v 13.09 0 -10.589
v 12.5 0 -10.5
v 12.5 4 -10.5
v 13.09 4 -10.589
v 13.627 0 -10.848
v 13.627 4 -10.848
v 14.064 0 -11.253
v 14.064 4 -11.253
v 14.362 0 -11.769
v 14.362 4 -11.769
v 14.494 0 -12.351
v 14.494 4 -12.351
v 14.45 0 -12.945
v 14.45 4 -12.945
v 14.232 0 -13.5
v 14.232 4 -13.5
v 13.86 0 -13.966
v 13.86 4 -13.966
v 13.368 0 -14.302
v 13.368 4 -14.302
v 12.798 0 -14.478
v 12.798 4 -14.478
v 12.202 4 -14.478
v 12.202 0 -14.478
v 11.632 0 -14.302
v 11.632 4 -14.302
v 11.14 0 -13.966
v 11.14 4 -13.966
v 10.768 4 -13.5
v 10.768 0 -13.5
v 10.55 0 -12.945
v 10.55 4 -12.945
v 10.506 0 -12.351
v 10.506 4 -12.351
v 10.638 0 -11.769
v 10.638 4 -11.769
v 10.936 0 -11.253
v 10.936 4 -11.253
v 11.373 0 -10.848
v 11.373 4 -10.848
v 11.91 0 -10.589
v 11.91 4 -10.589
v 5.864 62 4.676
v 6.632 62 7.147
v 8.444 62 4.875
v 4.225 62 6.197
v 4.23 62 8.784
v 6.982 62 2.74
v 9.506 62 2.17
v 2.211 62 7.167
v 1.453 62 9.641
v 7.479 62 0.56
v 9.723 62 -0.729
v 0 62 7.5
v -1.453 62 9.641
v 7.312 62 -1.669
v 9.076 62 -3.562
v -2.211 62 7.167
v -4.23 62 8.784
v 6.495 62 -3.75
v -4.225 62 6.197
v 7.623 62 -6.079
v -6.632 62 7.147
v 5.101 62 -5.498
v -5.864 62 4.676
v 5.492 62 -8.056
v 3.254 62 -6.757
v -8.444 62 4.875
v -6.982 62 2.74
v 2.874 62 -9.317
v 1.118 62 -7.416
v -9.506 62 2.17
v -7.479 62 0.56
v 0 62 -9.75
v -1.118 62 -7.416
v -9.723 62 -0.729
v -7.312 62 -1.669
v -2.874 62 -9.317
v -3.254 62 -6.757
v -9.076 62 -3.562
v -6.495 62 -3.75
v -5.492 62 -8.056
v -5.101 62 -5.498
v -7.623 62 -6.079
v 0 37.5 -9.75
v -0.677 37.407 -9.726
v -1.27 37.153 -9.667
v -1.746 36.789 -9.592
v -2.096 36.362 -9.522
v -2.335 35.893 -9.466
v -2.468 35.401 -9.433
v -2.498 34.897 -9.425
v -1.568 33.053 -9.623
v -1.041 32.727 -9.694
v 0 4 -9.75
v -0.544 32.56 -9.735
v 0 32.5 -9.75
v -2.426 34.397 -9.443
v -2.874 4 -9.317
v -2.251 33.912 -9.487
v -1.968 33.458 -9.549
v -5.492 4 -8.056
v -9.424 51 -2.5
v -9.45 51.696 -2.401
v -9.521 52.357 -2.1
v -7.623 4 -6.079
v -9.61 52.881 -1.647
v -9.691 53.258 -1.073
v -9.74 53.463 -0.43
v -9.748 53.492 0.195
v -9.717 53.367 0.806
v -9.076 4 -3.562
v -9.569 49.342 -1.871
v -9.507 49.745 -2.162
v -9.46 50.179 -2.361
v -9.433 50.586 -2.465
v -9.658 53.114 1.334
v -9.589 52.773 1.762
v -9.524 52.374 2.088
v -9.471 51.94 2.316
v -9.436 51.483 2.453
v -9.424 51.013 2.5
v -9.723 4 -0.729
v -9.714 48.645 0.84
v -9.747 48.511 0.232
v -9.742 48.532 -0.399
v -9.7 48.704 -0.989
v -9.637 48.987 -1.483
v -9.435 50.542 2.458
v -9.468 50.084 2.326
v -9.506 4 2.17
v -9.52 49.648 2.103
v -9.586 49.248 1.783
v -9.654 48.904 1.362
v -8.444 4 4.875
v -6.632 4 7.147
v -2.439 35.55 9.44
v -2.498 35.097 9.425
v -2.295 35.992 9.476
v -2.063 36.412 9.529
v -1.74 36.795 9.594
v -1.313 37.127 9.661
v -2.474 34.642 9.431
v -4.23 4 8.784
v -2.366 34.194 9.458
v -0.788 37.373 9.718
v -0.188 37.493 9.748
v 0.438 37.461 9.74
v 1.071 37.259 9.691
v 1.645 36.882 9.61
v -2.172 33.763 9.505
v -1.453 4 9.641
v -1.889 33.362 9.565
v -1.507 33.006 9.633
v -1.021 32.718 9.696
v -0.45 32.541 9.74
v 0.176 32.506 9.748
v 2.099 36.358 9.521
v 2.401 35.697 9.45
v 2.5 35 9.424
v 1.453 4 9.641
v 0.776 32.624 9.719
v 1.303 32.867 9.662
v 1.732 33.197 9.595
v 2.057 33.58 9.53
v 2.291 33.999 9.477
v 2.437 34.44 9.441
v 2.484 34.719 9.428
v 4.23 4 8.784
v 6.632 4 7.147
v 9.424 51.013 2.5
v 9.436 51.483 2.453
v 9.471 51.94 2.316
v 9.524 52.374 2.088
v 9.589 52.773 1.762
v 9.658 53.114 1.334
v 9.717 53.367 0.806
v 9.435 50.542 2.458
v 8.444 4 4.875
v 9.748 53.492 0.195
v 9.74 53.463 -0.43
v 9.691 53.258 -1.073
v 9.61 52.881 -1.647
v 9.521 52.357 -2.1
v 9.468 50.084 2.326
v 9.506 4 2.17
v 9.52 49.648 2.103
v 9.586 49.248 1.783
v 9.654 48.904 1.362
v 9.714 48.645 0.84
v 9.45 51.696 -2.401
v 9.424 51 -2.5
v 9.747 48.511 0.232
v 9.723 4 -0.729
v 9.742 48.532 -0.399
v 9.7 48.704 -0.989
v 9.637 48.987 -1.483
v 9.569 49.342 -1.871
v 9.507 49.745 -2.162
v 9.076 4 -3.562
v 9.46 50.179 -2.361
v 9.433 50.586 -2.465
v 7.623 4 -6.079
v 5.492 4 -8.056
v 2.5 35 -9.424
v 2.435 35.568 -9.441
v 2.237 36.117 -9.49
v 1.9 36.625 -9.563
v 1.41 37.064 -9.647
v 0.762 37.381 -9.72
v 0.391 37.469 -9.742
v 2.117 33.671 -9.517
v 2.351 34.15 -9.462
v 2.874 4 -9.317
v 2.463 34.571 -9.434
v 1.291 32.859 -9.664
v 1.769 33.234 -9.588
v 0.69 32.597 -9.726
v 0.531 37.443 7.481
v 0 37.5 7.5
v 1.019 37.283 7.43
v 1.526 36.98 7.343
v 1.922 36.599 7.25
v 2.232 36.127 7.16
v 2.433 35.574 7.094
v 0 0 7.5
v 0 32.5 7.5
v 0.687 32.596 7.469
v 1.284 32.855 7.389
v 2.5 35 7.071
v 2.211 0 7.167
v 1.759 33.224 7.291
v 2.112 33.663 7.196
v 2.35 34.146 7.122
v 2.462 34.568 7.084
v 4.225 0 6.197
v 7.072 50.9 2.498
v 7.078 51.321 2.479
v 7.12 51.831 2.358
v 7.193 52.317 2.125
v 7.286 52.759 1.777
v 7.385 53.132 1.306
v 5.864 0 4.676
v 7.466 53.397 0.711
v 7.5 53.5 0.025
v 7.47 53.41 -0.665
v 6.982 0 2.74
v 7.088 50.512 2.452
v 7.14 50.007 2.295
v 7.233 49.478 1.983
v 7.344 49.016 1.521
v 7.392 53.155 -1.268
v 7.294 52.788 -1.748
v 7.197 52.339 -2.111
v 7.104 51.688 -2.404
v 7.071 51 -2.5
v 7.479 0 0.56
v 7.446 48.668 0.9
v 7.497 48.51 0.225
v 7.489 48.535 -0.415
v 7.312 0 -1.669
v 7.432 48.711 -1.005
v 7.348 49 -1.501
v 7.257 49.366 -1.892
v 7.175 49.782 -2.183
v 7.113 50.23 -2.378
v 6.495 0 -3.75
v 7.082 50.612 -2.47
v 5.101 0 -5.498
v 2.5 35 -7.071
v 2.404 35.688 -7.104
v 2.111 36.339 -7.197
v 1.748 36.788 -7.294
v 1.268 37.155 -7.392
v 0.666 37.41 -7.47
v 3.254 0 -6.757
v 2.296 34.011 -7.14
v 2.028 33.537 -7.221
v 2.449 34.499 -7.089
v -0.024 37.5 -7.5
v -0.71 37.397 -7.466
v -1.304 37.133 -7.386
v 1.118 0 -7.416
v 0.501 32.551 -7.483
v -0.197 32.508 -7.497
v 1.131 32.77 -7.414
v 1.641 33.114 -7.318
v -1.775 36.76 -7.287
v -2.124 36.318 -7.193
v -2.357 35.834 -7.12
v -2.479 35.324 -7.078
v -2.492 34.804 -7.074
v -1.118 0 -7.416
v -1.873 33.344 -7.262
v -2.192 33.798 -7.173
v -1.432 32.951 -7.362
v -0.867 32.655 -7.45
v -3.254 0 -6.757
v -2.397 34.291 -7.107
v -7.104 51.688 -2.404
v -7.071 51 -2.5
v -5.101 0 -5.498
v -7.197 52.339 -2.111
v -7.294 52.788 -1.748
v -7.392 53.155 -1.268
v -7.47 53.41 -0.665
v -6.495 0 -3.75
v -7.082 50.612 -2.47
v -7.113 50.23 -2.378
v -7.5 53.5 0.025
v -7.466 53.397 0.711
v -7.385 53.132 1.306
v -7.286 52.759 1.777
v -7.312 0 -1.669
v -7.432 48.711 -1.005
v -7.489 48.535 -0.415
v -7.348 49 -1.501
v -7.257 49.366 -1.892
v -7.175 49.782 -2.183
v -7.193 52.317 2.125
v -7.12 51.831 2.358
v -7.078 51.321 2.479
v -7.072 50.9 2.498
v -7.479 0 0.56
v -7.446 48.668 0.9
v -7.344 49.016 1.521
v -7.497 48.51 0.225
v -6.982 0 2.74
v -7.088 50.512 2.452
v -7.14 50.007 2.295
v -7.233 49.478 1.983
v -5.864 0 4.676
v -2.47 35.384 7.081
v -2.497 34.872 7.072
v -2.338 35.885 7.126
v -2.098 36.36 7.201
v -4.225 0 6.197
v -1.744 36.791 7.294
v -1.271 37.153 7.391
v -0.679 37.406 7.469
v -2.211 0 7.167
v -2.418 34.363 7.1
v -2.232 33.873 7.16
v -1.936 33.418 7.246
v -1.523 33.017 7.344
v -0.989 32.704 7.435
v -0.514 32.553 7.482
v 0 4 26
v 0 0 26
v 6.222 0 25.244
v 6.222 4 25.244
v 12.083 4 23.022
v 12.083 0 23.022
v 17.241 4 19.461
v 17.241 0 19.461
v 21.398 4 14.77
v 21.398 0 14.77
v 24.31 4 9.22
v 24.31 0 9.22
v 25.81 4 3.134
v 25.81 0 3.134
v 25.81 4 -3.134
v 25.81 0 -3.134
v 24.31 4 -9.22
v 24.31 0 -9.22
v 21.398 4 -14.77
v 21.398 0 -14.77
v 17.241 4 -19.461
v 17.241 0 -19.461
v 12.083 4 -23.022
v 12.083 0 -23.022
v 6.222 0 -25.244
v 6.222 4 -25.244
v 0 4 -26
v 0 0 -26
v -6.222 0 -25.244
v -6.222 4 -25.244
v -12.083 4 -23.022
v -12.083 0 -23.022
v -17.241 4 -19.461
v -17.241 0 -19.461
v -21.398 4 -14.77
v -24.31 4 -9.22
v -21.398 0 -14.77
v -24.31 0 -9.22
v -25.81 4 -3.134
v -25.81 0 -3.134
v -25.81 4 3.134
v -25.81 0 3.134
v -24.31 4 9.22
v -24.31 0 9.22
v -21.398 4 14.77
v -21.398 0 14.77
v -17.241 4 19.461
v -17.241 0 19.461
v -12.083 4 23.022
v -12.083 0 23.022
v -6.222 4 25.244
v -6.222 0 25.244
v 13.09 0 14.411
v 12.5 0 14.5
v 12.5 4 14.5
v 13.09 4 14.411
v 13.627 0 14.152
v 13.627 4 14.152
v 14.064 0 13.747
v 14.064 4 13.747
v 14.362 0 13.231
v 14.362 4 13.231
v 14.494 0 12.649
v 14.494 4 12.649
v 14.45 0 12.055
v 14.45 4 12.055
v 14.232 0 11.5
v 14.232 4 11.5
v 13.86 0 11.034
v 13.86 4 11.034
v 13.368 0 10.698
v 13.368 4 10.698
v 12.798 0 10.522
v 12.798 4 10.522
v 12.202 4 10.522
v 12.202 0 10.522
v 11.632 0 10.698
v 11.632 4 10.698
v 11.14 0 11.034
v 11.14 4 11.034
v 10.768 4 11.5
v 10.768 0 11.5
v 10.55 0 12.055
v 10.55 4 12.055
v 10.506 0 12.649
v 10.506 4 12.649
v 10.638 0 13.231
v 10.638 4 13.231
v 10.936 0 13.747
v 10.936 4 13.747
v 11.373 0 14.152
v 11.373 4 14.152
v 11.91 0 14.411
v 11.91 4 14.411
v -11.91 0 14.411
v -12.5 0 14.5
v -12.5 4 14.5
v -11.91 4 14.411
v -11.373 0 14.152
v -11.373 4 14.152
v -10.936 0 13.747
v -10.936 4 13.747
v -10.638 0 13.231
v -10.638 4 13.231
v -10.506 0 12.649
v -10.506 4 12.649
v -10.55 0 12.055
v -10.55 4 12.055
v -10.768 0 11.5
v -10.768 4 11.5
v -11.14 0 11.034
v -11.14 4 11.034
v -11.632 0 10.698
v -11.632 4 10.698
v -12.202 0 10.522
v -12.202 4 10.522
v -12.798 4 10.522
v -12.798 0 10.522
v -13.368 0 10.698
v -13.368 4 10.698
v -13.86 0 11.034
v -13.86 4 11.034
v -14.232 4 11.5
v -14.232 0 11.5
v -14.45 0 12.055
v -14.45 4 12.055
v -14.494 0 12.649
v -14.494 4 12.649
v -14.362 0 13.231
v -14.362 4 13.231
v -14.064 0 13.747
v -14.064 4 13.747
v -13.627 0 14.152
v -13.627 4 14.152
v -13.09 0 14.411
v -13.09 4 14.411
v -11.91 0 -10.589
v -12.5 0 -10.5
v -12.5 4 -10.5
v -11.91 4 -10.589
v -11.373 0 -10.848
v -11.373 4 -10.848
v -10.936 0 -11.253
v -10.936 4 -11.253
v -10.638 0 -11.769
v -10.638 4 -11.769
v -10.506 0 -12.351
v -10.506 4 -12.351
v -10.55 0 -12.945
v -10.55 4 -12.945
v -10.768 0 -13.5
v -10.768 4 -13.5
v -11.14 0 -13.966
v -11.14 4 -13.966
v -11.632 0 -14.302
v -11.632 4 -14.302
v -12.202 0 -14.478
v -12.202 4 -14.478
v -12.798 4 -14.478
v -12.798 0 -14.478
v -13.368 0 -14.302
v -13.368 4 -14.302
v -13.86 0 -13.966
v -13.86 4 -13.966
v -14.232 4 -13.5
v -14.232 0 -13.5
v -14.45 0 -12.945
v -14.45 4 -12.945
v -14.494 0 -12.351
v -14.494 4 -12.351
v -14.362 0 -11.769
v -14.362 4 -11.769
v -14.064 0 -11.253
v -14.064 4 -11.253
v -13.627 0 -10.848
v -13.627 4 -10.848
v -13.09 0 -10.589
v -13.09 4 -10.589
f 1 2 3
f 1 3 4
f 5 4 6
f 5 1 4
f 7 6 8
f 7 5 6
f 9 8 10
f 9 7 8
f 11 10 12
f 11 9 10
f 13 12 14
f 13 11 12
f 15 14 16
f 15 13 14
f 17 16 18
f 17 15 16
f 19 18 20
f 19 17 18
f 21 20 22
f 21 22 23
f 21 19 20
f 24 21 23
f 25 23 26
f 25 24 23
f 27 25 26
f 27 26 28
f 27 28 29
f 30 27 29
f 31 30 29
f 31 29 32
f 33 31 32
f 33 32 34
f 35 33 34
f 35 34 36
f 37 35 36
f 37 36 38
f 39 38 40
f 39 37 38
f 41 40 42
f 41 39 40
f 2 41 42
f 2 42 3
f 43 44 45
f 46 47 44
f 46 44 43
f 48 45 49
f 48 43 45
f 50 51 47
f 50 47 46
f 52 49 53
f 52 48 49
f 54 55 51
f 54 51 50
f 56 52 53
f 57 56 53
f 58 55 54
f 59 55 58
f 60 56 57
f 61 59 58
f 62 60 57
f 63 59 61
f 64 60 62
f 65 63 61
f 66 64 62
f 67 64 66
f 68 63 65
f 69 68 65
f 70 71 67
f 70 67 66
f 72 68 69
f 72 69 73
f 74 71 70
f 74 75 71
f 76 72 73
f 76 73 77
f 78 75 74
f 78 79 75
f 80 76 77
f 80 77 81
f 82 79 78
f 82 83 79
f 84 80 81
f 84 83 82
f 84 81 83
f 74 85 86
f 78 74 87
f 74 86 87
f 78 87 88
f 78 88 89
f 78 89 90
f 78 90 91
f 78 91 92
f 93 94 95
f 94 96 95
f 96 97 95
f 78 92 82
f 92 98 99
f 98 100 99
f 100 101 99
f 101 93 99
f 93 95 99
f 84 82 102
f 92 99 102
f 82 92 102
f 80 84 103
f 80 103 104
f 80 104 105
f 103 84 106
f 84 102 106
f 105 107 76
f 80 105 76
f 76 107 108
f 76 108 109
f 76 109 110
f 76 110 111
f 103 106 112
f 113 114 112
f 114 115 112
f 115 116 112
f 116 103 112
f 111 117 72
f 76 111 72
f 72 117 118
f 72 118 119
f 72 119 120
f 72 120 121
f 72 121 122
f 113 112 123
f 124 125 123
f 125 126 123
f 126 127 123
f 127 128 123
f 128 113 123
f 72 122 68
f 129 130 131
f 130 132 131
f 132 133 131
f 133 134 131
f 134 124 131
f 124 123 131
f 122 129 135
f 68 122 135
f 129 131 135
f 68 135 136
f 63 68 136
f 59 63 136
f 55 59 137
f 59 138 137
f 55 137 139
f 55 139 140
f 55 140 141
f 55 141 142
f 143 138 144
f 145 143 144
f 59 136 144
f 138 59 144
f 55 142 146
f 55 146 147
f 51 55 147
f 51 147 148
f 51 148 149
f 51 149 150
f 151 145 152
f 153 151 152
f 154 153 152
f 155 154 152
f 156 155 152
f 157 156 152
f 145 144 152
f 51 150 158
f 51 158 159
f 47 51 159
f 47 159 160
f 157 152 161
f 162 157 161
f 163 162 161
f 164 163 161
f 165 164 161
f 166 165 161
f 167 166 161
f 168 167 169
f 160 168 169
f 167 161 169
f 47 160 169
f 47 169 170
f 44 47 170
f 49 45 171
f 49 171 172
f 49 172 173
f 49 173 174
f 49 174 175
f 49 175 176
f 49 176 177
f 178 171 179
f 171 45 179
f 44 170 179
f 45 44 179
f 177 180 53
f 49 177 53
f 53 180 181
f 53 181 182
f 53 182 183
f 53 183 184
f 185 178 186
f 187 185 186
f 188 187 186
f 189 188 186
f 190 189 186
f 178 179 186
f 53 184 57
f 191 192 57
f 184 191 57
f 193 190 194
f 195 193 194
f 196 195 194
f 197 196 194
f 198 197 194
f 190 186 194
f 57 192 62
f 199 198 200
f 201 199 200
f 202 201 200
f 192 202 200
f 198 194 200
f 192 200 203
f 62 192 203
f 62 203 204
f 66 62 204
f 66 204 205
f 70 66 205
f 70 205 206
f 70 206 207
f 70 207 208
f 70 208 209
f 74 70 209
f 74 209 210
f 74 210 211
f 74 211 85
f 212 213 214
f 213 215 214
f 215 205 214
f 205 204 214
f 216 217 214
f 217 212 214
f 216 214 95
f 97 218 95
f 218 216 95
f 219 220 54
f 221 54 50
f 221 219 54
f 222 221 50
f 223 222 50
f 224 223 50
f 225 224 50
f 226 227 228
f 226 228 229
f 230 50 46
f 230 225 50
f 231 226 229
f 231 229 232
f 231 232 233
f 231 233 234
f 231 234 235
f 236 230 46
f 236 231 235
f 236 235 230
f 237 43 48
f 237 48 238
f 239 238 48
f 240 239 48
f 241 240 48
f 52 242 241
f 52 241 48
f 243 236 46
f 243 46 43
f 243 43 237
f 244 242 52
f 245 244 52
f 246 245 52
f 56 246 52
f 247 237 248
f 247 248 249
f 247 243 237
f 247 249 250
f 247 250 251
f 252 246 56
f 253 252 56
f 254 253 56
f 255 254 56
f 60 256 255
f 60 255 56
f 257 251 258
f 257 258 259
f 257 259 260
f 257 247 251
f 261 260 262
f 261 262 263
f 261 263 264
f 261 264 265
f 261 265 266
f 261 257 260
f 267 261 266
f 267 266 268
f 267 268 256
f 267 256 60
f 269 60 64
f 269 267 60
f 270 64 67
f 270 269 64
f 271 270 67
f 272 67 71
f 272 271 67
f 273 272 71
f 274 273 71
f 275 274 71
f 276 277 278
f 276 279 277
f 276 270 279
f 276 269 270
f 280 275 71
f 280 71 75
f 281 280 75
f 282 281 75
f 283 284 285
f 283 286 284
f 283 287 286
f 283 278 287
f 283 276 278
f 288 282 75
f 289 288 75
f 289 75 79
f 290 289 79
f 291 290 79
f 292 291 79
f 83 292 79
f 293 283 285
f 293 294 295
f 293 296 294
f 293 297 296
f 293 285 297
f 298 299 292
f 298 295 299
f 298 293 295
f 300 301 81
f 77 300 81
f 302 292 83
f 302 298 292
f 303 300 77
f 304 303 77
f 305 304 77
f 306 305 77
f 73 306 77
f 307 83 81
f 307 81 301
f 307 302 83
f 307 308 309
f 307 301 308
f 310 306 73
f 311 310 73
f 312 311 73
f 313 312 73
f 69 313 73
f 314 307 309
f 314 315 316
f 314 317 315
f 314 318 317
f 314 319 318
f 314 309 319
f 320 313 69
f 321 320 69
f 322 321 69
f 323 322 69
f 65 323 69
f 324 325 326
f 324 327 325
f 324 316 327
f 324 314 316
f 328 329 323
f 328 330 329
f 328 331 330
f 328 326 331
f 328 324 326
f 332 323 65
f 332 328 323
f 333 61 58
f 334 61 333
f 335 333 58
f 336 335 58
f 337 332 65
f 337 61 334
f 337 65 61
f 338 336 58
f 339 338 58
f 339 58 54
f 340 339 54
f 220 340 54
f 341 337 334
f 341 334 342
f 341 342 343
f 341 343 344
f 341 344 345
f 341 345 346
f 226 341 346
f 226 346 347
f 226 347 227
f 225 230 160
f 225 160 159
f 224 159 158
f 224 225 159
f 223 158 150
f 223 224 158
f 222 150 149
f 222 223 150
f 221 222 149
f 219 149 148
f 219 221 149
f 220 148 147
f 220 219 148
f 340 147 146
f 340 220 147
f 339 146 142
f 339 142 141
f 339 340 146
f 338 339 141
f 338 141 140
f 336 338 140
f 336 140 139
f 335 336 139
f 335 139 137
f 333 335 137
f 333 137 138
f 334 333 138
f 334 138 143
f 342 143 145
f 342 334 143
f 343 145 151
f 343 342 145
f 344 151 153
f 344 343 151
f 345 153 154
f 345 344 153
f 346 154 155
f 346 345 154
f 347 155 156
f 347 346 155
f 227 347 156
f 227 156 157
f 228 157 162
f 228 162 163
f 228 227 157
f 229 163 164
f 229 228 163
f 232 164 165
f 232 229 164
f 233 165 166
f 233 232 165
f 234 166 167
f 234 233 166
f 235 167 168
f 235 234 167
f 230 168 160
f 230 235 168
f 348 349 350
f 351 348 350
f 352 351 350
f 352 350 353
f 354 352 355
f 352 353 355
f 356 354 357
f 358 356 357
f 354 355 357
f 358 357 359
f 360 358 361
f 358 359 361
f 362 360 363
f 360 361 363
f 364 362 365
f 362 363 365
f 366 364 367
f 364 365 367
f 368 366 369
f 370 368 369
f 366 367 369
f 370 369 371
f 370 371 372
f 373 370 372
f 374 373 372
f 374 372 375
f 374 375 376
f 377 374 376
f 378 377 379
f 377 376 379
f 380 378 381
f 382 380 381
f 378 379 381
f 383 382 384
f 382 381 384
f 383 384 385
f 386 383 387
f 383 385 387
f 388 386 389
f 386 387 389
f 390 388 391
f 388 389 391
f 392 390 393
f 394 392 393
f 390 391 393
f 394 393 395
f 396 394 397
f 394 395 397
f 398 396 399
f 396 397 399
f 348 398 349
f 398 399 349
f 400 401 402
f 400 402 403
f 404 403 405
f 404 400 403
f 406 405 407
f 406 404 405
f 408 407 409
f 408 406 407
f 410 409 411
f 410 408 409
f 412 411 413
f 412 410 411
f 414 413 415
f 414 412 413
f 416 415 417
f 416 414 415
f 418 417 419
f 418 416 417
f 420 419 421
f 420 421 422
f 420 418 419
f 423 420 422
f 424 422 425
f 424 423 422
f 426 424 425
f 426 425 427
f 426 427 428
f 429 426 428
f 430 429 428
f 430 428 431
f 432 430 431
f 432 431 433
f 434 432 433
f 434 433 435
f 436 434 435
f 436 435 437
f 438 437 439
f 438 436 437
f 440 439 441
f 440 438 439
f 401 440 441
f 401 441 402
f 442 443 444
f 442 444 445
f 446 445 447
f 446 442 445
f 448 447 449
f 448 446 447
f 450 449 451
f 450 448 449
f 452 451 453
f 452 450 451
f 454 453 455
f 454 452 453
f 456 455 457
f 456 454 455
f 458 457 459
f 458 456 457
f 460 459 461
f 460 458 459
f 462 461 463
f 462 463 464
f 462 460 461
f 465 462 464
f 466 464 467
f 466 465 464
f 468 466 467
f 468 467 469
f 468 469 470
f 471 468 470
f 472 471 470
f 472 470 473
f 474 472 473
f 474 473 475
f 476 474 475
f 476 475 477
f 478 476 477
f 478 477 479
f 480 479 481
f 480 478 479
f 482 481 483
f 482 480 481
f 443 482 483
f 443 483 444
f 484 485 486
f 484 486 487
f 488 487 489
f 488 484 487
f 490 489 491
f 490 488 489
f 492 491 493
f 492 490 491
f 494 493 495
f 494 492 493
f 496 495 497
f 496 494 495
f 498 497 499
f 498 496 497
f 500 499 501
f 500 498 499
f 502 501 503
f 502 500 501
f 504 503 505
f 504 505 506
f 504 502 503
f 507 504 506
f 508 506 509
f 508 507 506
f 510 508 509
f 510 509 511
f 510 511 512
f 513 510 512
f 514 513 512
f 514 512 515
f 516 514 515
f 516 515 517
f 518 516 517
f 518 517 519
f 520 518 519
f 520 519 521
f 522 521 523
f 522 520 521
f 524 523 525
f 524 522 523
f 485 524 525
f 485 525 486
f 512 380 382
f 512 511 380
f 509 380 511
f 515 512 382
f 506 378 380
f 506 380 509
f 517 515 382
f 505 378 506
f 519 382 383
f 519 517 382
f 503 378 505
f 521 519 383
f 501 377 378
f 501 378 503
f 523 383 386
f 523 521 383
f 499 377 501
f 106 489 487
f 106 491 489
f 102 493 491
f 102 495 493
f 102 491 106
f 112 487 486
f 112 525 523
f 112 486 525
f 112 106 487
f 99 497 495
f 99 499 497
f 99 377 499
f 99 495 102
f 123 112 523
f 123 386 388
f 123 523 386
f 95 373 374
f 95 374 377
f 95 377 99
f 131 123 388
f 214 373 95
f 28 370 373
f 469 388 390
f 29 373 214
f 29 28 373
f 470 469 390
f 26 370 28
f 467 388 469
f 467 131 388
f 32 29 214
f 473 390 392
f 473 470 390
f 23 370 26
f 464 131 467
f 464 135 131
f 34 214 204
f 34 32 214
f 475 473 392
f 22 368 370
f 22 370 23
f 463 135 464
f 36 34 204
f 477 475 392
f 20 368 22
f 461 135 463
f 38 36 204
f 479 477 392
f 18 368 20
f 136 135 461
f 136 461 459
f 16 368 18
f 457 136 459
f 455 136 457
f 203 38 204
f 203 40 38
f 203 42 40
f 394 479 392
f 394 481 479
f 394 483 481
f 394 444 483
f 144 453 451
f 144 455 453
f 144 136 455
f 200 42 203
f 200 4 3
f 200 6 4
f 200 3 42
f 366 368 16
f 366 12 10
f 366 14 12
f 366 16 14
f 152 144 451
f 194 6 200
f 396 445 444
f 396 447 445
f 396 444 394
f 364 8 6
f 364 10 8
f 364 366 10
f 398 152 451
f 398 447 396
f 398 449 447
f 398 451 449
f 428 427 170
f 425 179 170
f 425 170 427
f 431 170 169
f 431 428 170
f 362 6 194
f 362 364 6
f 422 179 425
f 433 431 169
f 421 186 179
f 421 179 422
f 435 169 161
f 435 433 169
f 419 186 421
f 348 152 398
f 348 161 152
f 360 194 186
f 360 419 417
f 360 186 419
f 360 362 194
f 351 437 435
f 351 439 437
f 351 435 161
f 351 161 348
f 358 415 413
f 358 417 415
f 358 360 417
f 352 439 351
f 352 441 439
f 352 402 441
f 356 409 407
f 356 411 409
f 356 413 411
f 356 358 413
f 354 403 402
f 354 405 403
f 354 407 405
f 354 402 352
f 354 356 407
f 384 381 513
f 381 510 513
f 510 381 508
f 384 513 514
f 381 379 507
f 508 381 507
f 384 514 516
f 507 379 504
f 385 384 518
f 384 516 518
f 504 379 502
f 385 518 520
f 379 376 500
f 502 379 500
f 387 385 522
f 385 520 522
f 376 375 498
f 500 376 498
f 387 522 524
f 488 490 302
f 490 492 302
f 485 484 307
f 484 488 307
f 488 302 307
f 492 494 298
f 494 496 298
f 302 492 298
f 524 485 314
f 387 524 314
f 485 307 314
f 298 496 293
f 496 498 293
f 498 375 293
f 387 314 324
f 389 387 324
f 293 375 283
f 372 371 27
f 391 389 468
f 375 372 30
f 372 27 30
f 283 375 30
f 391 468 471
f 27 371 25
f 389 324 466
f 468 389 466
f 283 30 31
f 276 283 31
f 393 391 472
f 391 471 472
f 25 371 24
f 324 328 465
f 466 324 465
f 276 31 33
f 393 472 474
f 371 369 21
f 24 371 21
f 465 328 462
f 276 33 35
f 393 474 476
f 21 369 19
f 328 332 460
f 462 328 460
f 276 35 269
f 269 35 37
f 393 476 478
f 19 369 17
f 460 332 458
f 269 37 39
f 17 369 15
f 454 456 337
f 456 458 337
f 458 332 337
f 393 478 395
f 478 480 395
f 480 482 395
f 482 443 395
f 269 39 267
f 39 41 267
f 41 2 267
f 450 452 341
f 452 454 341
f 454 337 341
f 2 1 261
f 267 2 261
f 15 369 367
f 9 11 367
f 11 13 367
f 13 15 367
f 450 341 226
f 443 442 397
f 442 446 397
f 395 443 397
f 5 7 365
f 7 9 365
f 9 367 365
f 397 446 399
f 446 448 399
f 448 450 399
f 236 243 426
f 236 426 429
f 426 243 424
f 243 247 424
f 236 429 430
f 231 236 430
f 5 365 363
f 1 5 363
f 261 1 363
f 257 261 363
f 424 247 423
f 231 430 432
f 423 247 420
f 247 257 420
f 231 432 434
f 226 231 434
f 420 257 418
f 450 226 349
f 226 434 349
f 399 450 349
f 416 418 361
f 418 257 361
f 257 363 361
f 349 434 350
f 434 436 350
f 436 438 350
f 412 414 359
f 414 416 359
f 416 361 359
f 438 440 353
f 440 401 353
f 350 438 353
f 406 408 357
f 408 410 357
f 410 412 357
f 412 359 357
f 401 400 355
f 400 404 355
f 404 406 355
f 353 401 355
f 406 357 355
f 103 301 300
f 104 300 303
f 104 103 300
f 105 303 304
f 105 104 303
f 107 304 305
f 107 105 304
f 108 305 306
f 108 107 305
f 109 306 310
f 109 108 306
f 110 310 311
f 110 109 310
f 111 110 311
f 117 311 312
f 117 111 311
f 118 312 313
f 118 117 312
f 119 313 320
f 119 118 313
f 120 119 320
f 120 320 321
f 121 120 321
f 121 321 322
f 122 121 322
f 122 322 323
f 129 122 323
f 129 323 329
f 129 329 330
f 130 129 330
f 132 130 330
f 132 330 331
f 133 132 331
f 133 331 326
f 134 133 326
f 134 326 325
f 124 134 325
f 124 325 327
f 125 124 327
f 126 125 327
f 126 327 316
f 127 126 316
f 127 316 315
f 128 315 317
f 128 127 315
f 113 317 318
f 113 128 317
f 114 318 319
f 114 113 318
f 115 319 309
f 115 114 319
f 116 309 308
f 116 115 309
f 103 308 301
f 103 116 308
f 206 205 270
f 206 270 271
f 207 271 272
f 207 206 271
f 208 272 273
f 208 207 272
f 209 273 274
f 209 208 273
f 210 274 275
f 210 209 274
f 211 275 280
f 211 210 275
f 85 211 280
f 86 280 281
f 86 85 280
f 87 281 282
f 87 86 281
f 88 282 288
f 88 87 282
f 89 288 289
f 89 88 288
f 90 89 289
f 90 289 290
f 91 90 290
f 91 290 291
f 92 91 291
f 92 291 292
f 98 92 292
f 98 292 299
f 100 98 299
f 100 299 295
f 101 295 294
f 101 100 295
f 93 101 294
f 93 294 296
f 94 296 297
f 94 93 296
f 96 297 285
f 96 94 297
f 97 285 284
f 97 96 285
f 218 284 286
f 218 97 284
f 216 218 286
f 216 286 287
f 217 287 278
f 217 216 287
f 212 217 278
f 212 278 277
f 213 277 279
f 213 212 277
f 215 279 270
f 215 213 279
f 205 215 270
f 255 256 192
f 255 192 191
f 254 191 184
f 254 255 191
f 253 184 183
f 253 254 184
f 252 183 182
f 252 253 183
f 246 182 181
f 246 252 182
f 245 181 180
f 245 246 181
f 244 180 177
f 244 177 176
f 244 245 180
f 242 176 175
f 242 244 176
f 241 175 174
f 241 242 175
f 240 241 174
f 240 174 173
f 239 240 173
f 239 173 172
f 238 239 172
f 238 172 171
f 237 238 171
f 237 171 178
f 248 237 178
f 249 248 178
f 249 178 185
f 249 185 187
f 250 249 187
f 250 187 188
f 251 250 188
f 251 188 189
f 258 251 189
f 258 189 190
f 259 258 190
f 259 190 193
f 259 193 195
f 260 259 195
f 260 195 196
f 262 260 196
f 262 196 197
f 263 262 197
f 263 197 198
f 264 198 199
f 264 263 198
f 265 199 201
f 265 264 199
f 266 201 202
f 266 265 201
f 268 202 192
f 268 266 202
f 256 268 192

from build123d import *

# Parameters (mm, degrees)
SKETCH1_R               = 26
SKETCH1_R_2             = 2
SKETCH1_R_3             = 7.5
BOSS_EXTRUDE1_DEPTH     = 4
SKETCH3_R               = 9.75
SKETCH3_R_2             = 7.5
BOSS_EXTRUDE2_DEPTH     = 58
CUT_EXTRUDE1_DEPTH      = 73.083285164
CUT_EXTRUDE1_DEPTH_BACK = 73.083285164
SKETCH5_R               = 2.5
CUT_EXTRUDE2_DEPTH      = 73.08328525
CUT_EXTRUDE2_DEPTH_BACK = 73.08328525
SKETCH6_R               = 2.5


with BuildPart() as part:
    # Sketch1 → Boss-Extrude1 (new body)
    with BuildSketch(Plane(origin=(0, 0, 0), x_dir=(1, 0, 0), z_dir=(0, 1, 0))):
        with Locations(Location((0, 0, 0), (0, 0, 270))):
            Circle(SKETCH1_R)
        with Locations(Location((-12.5, 12.5, 0), (0, 0, 270))):
            Circle(SKETCH1_R_2, mode=Mode.SUBTRACT)
        with Locations(Location((-12.5, -12.5, 0), (0, 0, 270))):
            Circle(SKETCH1_R_2, mode=Mode.SUBTRACT)
        with Locations(Location((12.5, 12.5, 0), (0, 0, 270))):
            Circle(SKETCH1_R_2, mode=Mode.SUBTRACT)
        with Locations(Location((12.5, -12.5, 0), (0, 0, 270))):
            Circle(SKETCH1_R_2, mode=Mode.SUBTRACT)
        with Locations(Location((0, 0, 0), (0, 0, 270))):
            Circle(SKETCH1_R_3, mode=Mode.SUBTRACT)
    extrude(amount=BOSS_EXTRUDE1_DEPTH)

    # Sketch3 → Boss-Extrude2 (add)
    with BuildSketch(Plane(origin=(0, 4, 0), x_dir=(1, 0, 0), z_dir=(0, 1, 0))):
        with Locations(Location((0, 0, 0), (0, 0, 90))):
            Circle(SKETCH3_R)
        with Locations(Location((0, 0, 0), (0, 0, 270))):
            Circle(SKETCH3_R_2, mode=Mode.SUBTRACT)
    extrude(amount=BOSS_EXTRUDE2_DEPTH)

    # Sketch5 → Cut-Extrude1 (cut, two sides: drawn at the far end of the back side and taken through both)
    with BuildSketch(Plane.XY.offset(-CUT_EXTRUDE1_DEPTH_BACK)):
        with Locations((0, 35)):
            Circle(SKETCH5_R)
    extrude(amount=CUT_EXTRUDE1_DEPTH + CUT_EXTRUDE1_DEPTH_BACK, mode=Mode.SUBTRACT)

    # Sketch6 → Cut-Extrude2 (cut, two sides: drawn at the far end of the back side and taken through both)
    with BuildSketch(Plane(origin=(0, 0, 0), x_dir=(0, 0, -1), z_dir=(1, 0, 0)).offset(-CUT_EXTRUDE2_DEPTH_BACK)):
        with Locations((0, 51)):
            Circle(SKETCH6_R)
    extrude(amount=CUT_EXTRUDE2_DEPTH + CUT_EXTRUDE2_DEPTH_BACK, mode=Mode.SUBTRACT)


solid = part.part
